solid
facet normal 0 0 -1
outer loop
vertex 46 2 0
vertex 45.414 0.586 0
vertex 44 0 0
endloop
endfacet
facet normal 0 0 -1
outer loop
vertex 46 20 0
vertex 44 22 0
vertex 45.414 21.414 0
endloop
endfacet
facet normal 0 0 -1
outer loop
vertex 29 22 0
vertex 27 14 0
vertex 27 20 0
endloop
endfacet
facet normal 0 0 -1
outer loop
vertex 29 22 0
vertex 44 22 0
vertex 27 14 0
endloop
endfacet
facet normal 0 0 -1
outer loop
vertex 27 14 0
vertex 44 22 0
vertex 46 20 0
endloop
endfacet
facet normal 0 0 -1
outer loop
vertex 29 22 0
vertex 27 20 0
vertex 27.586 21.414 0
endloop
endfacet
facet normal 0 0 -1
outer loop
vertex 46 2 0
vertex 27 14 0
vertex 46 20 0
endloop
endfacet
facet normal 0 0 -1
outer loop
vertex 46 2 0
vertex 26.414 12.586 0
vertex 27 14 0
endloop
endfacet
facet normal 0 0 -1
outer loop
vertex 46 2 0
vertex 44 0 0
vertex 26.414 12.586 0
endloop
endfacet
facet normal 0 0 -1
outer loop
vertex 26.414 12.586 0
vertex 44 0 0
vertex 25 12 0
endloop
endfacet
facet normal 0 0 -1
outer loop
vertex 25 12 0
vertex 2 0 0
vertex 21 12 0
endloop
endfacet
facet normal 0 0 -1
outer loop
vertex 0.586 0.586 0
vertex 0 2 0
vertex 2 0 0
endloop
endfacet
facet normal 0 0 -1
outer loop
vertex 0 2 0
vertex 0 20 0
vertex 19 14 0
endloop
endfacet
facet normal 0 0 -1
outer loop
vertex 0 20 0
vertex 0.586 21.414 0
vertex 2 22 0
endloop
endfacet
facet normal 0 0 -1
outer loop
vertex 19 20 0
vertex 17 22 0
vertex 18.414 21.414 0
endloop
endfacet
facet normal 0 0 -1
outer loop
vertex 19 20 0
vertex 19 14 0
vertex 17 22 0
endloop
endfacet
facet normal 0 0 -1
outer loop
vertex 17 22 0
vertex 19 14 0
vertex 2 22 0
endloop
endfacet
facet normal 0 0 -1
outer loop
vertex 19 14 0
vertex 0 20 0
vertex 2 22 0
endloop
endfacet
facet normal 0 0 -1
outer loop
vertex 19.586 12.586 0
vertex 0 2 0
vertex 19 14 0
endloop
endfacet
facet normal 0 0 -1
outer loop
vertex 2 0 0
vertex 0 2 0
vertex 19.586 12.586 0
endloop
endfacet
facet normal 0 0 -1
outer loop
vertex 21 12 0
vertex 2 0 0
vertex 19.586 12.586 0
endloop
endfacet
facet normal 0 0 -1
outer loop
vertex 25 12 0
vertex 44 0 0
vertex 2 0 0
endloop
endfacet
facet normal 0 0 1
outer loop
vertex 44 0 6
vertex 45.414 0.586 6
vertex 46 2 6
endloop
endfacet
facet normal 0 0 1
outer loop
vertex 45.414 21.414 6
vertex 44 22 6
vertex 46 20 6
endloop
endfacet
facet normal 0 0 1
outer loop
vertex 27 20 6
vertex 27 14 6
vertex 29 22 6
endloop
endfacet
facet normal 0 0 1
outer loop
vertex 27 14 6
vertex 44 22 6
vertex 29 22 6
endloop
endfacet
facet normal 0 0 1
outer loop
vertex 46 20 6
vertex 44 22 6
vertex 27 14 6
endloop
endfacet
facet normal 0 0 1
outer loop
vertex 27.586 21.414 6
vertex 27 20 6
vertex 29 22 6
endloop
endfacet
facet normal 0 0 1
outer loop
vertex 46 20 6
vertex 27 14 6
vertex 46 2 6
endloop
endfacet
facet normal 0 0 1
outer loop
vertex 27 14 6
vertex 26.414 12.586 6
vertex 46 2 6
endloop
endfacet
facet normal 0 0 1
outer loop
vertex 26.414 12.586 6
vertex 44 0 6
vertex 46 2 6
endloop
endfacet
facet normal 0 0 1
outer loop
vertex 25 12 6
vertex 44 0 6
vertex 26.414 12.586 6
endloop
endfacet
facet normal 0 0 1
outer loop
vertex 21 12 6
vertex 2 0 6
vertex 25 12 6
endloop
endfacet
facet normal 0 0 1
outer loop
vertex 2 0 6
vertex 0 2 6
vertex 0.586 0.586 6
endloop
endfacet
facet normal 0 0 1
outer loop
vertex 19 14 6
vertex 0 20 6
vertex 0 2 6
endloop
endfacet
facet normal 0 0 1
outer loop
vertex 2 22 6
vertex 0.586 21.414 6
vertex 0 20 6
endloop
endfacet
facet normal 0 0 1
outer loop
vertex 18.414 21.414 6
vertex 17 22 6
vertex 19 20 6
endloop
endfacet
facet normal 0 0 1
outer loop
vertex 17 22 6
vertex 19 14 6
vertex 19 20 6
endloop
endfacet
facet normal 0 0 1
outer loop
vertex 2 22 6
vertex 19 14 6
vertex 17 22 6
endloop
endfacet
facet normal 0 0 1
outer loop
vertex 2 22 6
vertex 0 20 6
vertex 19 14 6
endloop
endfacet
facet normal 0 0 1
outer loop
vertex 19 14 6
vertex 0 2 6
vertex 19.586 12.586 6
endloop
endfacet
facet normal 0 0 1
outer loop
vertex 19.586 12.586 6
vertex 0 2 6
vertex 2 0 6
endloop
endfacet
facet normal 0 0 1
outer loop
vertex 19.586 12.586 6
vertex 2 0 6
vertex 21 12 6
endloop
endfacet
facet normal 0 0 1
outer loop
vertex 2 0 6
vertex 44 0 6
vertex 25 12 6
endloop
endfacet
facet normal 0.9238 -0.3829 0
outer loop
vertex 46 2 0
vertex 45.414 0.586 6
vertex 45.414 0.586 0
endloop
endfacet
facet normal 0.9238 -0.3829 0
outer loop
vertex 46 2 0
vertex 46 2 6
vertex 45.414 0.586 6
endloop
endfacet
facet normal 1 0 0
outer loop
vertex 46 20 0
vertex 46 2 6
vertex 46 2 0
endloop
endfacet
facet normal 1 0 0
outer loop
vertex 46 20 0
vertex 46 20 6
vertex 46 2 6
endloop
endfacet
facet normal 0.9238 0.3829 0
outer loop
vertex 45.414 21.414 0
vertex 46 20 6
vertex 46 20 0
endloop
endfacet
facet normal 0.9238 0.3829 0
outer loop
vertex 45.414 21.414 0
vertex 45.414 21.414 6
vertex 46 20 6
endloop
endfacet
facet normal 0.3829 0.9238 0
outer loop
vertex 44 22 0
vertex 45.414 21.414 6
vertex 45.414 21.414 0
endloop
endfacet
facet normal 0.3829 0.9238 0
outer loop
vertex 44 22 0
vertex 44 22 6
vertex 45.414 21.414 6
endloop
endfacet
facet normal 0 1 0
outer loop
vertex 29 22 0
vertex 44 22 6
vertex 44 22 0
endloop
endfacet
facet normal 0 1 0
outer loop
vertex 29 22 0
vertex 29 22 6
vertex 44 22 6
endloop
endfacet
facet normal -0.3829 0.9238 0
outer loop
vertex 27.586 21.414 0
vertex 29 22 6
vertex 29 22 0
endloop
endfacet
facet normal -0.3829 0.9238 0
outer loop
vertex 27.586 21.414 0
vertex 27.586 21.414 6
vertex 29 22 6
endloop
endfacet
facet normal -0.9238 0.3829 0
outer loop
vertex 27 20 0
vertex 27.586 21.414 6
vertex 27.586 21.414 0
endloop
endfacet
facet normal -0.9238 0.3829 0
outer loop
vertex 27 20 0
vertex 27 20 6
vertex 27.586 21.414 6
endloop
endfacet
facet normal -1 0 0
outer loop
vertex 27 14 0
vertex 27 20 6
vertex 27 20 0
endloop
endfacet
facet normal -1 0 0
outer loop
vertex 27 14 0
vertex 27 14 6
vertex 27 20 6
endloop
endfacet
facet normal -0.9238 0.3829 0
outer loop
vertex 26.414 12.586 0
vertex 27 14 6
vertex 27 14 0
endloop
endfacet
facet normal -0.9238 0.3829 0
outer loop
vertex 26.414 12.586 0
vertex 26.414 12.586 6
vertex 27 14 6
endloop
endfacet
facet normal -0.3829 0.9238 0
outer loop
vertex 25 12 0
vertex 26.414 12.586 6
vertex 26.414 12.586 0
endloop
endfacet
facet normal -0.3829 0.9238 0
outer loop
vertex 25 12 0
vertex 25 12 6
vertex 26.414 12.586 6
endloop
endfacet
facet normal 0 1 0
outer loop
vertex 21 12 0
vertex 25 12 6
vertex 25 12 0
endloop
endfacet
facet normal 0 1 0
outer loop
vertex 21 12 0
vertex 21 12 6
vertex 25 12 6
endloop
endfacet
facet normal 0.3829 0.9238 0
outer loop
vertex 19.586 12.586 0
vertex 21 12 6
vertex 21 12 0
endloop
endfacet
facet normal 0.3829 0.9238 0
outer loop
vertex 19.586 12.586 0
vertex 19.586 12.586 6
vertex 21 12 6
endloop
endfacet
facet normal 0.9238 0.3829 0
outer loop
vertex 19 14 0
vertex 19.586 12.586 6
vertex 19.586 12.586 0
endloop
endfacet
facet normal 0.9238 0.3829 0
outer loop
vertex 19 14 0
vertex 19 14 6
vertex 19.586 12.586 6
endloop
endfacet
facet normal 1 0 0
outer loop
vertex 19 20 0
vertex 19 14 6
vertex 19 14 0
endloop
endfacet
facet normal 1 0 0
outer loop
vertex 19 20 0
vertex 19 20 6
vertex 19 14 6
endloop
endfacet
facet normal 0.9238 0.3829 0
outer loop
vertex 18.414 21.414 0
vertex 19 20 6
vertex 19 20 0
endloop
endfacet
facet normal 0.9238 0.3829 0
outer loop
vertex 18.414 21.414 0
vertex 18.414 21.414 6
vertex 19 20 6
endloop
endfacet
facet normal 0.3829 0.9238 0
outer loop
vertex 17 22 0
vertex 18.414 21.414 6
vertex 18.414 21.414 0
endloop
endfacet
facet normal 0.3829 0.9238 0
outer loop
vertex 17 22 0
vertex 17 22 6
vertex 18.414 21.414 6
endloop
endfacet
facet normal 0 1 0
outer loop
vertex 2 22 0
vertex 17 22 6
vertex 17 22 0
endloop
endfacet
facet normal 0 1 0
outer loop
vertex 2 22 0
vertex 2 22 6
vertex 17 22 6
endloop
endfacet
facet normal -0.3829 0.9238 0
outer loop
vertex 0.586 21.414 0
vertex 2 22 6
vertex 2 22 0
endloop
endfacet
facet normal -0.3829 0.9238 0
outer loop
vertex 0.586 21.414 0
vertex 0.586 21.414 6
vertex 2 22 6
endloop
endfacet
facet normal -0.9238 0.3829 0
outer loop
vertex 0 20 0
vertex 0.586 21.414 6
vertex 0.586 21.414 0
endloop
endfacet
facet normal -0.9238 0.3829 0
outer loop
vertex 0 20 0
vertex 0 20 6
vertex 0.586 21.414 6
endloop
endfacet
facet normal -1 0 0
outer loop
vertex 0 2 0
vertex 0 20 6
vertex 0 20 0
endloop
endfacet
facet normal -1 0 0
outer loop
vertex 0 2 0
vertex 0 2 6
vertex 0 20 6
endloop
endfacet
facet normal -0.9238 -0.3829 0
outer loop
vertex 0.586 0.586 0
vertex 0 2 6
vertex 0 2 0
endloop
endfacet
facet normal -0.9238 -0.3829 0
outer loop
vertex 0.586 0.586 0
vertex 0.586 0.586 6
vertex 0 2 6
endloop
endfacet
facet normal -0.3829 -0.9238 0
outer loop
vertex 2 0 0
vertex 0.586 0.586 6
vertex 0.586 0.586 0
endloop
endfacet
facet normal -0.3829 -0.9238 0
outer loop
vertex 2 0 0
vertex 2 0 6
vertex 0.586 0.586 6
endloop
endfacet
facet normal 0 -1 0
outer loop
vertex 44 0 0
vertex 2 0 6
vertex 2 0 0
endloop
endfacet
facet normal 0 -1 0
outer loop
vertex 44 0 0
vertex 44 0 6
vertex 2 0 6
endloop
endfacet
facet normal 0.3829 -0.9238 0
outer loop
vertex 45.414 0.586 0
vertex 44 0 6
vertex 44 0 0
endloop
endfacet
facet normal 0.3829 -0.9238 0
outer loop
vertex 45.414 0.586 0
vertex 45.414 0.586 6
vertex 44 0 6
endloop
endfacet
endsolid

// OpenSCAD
$fn = 32;

// ----------------------------------------------------------------------
// Eye lug: clevis, 6 mm thick
// ----------------------------------------------------------------------

// --- parameters (mm) ---
profile_height = 6;       // extrusion height
profile_points = 24;      // points of the closed outline

profile = [[0, 2], [0.586, 0.586], [2, 0], [44, 0], [45.414, 0.586], [46, 2], [46, 20], [45.414, 21.414], [44, 22], [29, 22], [27.586, 21.414], [27, 20], [27, 14], [26.414, 12.586], [25, 12], [21, 12], [19.586, 12.586], [19, 14], [19, 20], [18.414, 21.414], [17, 22], [2, 22], [0.586, 21.414], [0, 20]];  // single closed polygon, 24 points, counter clockwise

// --- the one profile operation ---
linear_extrude(height = profile_height) polygon(points = profile);
